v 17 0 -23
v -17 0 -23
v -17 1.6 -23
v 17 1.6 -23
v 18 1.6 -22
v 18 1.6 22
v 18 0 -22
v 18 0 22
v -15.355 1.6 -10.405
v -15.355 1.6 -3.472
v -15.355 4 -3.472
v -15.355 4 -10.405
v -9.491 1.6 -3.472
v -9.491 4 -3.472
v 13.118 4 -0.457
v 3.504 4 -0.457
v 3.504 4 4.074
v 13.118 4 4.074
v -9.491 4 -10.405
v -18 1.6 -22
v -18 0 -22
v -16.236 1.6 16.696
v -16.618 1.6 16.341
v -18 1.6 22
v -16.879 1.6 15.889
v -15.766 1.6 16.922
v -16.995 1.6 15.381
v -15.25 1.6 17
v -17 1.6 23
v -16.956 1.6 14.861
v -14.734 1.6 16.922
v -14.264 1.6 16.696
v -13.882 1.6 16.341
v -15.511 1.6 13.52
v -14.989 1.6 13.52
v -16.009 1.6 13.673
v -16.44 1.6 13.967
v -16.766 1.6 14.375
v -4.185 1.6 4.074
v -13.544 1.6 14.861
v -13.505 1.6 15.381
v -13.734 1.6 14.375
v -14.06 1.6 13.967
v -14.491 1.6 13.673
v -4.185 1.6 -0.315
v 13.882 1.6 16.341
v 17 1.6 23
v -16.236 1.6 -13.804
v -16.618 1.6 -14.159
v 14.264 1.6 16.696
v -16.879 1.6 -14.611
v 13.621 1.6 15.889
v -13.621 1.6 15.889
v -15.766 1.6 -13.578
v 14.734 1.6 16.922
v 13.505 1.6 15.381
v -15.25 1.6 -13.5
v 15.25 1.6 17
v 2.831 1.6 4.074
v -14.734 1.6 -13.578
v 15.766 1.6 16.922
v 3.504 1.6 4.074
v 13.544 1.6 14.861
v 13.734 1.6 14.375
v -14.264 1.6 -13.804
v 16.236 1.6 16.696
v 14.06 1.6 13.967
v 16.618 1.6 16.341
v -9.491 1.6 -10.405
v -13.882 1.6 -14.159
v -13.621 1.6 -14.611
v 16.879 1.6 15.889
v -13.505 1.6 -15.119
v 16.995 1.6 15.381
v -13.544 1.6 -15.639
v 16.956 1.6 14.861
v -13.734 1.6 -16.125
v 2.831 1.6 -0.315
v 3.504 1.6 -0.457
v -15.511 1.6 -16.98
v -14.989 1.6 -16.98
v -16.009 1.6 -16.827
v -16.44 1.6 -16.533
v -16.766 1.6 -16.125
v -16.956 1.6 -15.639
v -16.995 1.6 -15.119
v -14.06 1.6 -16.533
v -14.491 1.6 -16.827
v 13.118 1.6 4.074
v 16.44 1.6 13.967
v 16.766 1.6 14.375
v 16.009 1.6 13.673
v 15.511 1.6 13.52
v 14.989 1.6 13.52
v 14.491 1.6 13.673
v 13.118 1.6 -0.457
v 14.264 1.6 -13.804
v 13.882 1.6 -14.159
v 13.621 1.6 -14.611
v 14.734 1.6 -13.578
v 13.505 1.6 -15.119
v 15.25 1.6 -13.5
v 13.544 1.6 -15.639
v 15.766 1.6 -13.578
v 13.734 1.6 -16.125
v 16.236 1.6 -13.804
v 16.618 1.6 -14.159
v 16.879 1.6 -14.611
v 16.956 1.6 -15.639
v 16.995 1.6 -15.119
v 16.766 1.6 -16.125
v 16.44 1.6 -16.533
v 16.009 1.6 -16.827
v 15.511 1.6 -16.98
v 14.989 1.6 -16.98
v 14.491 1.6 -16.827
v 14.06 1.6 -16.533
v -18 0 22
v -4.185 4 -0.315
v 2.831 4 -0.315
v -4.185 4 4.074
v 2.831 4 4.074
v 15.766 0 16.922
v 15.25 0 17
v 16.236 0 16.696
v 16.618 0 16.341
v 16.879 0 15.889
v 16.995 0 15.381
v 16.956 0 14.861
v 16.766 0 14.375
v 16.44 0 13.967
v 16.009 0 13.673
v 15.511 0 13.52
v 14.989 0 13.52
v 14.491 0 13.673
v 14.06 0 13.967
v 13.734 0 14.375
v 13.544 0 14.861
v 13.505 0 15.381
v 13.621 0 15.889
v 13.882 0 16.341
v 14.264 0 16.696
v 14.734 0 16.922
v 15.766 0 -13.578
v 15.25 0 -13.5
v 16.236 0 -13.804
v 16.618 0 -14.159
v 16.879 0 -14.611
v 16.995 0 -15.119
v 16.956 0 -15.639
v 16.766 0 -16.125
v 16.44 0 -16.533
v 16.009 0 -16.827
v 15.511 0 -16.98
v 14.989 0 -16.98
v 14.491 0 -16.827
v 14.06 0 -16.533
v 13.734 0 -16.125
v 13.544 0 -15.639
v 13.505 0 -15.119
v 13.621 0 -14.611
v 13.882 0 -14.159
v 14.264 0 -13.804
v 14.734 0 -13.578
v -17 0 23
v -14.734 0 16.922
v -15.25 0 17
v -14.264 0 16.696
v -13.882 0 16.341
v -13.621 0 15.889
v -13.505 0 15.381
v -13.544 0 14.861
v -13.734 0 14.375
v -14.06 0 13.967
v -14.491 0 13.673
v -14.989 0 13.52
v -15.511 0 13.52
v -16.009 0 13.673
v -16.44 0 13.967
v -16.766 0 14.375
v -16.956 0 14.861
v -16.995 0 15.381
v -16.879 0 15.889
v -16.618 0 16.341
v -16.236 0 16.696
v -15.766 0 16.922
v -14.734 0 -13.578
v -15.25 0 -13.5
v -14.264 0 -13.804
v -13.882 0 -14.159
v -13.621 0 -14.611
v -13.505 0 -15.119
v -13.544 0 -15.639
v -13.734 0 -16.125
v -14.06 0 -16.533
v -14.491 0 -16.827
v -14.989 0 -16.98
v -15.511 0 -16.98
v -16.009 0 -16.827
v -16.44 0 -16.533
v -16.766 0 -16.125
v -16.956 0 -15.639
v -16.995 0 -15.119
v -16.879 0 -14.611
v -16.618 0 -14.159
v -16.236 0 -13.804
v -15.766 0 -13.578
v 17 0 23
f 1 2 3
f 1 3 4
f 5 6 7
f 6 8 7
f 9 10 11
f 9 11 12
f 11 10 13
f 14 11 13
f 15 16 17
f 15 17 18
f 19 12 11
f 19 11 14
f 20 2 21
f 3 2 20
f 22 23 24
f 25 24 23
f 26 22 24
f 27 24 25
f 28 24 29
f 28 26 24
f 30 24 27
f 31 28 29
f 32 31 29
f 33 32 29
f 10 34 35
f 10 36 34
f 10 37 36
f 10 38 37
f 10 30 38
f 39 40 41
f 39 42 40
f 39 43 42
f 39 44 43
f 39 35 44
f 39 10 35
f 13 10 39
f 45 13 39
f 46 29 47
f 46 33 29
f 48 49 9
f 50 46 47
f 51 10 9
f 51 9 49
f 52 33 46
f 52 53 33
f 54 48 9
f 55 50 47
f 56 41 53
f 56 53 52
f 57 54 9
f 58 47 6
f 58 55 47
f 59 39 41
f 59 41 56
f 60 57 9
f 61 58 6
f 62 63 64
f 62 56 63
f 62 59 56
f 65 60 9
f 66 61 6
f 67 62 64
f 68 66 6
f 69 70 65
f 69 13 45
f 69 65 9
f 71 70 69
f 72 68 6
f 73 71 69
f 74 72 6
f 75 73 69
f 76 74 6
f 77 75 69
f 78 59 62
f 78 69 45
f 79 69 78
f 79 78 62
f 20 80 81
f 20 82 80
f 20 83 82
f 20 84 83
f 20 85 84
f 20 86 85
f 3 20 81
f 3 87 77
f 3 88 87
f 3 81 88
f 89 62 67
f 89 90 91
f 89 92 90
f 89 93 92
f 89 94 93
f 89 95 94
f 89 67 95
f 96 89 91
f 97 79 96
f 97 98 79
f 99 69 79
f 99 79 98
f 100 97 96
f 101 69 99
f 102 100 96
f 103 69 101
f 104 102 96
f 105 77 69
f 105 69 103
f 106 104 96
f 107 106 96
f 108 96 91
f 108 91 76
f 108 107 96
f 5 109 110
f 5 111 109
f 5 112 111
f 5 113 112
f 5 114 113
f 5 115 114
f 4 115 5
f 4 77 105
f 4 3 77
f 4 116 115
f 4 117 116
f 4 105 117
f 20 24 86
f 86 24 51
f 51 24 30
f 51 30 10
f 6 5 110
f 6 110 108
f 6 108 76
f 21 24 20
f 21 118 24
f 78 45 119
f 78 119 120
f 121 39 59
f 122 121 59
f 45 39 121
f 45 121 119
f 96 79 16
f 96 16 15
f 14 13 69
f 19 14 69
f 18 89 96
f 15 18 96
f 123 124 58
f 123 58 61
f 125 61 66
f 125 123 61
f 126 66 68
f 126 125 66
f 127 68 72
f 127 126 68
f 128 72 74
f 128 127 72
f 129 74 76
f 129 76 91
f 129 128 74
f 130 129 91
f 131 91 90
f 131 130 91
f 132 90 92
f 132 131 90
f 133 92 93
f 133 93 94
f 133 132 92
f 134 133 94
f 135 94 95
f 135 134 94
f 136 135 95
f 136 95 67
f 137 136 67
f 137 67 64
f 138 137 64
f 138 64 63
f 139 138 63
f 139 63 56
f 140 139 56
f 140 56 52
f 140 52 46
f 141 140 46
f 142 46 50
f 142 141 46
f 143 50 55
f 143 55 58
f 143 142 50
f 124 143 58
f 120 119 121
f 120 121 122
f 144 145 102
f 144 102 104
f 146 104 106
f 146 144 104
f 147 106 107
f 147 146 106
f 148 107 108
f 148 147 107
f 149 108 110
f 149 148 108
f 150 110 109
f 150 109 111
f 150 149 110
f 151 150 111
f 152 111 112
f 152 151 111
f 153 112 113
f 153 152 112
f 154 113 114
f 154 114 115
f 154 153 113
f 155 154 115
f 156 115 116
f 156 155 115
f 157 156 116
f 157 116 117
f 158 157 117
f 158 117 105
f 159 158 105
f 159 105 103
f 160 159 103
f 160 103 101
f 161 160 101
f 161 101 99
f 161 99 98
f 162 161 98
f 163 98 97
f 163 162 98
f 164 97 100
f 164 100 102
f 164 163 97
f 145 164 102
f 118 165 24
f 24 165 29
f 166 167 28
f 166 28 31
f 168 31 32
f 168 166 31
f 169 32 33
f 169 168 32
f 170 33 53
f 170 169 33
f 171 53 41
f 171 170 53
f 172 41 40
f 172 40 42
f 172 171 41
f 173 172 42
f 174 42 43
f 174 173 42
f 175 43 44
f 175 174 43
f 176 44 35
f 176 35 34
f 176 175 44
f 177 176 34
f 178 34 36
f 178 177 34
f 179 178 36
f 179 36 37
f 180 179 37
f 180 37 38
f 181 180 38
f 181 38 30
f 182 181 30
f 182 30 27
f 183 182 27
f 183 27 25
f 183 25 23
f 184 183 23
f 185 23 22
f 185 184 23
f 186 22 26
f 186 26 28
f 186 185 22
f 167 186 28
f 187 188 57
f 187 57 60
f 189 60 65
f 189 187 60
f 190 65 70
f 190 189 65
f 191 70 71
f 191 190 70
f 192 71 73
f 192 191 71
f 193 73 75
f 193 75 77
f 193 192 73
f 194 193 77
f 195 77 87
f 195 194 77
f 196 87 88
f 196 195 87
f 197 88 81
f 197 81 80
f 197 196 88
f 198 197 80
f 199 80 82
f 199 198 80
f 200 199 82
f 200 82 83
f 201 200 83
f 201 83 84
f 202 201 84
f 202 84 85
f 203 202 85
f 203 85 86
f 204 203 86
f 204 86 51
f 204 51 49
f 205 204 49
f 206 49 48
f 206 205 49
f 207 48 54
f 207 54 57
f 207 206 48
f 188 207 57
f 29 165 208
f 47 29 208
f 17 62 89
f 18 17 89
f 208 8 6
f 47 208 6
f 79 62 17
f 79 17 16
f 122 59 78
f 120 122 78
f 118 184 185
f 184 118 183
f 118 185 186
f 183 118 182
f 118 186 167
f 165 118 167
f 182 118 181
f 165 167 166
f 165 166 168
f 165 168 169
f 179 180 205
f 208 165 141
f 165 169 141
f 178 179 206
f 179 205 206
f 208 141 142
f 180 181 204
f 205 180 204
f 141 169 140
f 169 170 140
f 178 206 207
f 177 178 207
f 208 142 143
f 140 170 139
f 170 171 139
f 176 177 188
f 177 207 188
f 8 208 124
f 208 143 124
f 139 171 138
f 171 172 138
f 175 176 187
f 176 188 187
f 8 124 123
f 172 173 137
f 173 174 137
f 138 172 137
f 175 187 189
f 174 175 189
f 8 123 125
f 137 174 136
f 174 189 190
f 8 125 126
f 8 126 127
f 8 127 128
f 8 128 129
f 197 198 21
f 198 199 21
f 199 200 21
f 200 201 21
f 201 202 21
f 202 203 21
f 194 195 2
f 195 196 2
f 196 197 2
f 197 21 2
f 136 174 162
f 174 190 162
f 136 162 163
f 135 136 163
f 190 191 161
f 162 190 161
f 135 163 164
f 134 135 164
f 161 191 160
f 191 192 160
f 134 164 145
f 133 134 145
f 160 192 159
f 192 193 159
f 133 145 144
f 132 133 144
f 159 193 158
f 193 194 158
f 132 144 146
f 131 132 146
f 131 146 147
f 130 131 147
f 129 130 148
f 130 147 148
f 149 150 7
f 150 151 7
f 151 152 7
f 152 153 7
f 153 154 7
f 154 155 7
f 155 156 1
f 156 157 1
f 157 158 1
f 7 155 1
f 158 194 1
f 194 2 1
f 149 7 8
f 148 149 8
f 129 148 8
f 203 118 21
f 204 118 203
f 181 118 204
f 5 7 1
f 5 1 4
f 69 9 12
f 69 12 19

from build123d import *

# Parameters (mm, degrees)
SKETCH1_W        = 36
SKETCH1_H        = 5
SKETCH1_H_2      = 36
SKETCH1_R        = 1.75
PCB_DEPTH        = 1.6
SKETCH2_W        = 5.863870515
SKETCH2_H        = 6.933382723
SKETCH2_W_2      = 7.016073618
SKETCH2_H_2      = 4.389541424
SKETCH2_W_3      = 9.613875512
SKETCH2_H_3      = 4.530712508
COMPONENTS_DEPTH = 2.4
CORNERS_SIZE     = 1


with BuildPart() as part:
    # Sketch1 → PCB (new body)
    # profile 1 of 3: a face of its own
    with BuildSketch(Plane(origin=(0, 0, 0), x_dir=(1, 0, 0), z_dir=(0, 1, 0))):
        with Locations((0, 20.5)):
            Rectangle(SKETCH1_W, SKETCH1_H)
    # profile 2 of 3: a face of its own
    with BuildSketch(Plane(origin=(0, 0, 0), x_dir=(1, 0, 0), z_dir=(0, 1, 0))):
        Rectangle(SKETCH1_W, SKETCH1_H_2)
        with Locations(Location((-15.25, -15.25, 0), (0, 0, 270))):
            Circle(SKETCH1_R, mode=Mode.SUBTRACT)
        with Locations(Location((15.25, -15.25, 0), (0, 0, 270))):
            Circle(SKETCH1_R, mode=Mode.SUBTRACT)
        with Locations(Location((-15.25, 15.25, 0), (0, 0, 270))):
            Circle(SKETCH1_R, mode=Mode.SUBTRACT)
        with Locations(Location((15.25, 15.25, 0), (0, 0, 270))):
            Circle(SKETCH1_R, mode=Mode.SUBTRACT)
    # profile 3 of 3: a face of its own
    with BuildSketch(Plane(origin=(0, 0, 0), x_dir=(1, 0, 0), z_dir=(0, 1, 0))):
        with Locations((0, -20.5)):
            Rectangle(SKETCH1_W, SKETCH1_H)
    extrude(amount=PCB_DEPTH)

    # Sketch2 → Components (add)
    with BuildSketch(Plane(origin=(0, 1.6, 0), x_dir=(1, 0, 0), z_dir=(0, 1, 0))):
        with Locations((-12.422852881, 6.938659117)):
            Rectangle(SKETCH2_W, SKETCH2_H)
        with Locations((-0.676707896, -1.879325534)):
            Rectangle(SKETCH2_W_2, SKETCH2_H_2)
        with Locations((8.311019041, -1.808739992)):
            Rectangle(SKETCH2_W_3, SKETCH2_H_3)
    extrude(amount=COMPONENTS_DEPTH)

    # Corners
    corners_edges = [part.edges().sort_by_distance(p)[0] for p in [
        (-18, 0.8, -23),
        (18, 0.8, -23),
        (18, 0.8, 23),
        (-18, 0.8, 23),
    ]]
    chamfer(corners_edges, length=CORNERS_SIZE)


solid = part.part
